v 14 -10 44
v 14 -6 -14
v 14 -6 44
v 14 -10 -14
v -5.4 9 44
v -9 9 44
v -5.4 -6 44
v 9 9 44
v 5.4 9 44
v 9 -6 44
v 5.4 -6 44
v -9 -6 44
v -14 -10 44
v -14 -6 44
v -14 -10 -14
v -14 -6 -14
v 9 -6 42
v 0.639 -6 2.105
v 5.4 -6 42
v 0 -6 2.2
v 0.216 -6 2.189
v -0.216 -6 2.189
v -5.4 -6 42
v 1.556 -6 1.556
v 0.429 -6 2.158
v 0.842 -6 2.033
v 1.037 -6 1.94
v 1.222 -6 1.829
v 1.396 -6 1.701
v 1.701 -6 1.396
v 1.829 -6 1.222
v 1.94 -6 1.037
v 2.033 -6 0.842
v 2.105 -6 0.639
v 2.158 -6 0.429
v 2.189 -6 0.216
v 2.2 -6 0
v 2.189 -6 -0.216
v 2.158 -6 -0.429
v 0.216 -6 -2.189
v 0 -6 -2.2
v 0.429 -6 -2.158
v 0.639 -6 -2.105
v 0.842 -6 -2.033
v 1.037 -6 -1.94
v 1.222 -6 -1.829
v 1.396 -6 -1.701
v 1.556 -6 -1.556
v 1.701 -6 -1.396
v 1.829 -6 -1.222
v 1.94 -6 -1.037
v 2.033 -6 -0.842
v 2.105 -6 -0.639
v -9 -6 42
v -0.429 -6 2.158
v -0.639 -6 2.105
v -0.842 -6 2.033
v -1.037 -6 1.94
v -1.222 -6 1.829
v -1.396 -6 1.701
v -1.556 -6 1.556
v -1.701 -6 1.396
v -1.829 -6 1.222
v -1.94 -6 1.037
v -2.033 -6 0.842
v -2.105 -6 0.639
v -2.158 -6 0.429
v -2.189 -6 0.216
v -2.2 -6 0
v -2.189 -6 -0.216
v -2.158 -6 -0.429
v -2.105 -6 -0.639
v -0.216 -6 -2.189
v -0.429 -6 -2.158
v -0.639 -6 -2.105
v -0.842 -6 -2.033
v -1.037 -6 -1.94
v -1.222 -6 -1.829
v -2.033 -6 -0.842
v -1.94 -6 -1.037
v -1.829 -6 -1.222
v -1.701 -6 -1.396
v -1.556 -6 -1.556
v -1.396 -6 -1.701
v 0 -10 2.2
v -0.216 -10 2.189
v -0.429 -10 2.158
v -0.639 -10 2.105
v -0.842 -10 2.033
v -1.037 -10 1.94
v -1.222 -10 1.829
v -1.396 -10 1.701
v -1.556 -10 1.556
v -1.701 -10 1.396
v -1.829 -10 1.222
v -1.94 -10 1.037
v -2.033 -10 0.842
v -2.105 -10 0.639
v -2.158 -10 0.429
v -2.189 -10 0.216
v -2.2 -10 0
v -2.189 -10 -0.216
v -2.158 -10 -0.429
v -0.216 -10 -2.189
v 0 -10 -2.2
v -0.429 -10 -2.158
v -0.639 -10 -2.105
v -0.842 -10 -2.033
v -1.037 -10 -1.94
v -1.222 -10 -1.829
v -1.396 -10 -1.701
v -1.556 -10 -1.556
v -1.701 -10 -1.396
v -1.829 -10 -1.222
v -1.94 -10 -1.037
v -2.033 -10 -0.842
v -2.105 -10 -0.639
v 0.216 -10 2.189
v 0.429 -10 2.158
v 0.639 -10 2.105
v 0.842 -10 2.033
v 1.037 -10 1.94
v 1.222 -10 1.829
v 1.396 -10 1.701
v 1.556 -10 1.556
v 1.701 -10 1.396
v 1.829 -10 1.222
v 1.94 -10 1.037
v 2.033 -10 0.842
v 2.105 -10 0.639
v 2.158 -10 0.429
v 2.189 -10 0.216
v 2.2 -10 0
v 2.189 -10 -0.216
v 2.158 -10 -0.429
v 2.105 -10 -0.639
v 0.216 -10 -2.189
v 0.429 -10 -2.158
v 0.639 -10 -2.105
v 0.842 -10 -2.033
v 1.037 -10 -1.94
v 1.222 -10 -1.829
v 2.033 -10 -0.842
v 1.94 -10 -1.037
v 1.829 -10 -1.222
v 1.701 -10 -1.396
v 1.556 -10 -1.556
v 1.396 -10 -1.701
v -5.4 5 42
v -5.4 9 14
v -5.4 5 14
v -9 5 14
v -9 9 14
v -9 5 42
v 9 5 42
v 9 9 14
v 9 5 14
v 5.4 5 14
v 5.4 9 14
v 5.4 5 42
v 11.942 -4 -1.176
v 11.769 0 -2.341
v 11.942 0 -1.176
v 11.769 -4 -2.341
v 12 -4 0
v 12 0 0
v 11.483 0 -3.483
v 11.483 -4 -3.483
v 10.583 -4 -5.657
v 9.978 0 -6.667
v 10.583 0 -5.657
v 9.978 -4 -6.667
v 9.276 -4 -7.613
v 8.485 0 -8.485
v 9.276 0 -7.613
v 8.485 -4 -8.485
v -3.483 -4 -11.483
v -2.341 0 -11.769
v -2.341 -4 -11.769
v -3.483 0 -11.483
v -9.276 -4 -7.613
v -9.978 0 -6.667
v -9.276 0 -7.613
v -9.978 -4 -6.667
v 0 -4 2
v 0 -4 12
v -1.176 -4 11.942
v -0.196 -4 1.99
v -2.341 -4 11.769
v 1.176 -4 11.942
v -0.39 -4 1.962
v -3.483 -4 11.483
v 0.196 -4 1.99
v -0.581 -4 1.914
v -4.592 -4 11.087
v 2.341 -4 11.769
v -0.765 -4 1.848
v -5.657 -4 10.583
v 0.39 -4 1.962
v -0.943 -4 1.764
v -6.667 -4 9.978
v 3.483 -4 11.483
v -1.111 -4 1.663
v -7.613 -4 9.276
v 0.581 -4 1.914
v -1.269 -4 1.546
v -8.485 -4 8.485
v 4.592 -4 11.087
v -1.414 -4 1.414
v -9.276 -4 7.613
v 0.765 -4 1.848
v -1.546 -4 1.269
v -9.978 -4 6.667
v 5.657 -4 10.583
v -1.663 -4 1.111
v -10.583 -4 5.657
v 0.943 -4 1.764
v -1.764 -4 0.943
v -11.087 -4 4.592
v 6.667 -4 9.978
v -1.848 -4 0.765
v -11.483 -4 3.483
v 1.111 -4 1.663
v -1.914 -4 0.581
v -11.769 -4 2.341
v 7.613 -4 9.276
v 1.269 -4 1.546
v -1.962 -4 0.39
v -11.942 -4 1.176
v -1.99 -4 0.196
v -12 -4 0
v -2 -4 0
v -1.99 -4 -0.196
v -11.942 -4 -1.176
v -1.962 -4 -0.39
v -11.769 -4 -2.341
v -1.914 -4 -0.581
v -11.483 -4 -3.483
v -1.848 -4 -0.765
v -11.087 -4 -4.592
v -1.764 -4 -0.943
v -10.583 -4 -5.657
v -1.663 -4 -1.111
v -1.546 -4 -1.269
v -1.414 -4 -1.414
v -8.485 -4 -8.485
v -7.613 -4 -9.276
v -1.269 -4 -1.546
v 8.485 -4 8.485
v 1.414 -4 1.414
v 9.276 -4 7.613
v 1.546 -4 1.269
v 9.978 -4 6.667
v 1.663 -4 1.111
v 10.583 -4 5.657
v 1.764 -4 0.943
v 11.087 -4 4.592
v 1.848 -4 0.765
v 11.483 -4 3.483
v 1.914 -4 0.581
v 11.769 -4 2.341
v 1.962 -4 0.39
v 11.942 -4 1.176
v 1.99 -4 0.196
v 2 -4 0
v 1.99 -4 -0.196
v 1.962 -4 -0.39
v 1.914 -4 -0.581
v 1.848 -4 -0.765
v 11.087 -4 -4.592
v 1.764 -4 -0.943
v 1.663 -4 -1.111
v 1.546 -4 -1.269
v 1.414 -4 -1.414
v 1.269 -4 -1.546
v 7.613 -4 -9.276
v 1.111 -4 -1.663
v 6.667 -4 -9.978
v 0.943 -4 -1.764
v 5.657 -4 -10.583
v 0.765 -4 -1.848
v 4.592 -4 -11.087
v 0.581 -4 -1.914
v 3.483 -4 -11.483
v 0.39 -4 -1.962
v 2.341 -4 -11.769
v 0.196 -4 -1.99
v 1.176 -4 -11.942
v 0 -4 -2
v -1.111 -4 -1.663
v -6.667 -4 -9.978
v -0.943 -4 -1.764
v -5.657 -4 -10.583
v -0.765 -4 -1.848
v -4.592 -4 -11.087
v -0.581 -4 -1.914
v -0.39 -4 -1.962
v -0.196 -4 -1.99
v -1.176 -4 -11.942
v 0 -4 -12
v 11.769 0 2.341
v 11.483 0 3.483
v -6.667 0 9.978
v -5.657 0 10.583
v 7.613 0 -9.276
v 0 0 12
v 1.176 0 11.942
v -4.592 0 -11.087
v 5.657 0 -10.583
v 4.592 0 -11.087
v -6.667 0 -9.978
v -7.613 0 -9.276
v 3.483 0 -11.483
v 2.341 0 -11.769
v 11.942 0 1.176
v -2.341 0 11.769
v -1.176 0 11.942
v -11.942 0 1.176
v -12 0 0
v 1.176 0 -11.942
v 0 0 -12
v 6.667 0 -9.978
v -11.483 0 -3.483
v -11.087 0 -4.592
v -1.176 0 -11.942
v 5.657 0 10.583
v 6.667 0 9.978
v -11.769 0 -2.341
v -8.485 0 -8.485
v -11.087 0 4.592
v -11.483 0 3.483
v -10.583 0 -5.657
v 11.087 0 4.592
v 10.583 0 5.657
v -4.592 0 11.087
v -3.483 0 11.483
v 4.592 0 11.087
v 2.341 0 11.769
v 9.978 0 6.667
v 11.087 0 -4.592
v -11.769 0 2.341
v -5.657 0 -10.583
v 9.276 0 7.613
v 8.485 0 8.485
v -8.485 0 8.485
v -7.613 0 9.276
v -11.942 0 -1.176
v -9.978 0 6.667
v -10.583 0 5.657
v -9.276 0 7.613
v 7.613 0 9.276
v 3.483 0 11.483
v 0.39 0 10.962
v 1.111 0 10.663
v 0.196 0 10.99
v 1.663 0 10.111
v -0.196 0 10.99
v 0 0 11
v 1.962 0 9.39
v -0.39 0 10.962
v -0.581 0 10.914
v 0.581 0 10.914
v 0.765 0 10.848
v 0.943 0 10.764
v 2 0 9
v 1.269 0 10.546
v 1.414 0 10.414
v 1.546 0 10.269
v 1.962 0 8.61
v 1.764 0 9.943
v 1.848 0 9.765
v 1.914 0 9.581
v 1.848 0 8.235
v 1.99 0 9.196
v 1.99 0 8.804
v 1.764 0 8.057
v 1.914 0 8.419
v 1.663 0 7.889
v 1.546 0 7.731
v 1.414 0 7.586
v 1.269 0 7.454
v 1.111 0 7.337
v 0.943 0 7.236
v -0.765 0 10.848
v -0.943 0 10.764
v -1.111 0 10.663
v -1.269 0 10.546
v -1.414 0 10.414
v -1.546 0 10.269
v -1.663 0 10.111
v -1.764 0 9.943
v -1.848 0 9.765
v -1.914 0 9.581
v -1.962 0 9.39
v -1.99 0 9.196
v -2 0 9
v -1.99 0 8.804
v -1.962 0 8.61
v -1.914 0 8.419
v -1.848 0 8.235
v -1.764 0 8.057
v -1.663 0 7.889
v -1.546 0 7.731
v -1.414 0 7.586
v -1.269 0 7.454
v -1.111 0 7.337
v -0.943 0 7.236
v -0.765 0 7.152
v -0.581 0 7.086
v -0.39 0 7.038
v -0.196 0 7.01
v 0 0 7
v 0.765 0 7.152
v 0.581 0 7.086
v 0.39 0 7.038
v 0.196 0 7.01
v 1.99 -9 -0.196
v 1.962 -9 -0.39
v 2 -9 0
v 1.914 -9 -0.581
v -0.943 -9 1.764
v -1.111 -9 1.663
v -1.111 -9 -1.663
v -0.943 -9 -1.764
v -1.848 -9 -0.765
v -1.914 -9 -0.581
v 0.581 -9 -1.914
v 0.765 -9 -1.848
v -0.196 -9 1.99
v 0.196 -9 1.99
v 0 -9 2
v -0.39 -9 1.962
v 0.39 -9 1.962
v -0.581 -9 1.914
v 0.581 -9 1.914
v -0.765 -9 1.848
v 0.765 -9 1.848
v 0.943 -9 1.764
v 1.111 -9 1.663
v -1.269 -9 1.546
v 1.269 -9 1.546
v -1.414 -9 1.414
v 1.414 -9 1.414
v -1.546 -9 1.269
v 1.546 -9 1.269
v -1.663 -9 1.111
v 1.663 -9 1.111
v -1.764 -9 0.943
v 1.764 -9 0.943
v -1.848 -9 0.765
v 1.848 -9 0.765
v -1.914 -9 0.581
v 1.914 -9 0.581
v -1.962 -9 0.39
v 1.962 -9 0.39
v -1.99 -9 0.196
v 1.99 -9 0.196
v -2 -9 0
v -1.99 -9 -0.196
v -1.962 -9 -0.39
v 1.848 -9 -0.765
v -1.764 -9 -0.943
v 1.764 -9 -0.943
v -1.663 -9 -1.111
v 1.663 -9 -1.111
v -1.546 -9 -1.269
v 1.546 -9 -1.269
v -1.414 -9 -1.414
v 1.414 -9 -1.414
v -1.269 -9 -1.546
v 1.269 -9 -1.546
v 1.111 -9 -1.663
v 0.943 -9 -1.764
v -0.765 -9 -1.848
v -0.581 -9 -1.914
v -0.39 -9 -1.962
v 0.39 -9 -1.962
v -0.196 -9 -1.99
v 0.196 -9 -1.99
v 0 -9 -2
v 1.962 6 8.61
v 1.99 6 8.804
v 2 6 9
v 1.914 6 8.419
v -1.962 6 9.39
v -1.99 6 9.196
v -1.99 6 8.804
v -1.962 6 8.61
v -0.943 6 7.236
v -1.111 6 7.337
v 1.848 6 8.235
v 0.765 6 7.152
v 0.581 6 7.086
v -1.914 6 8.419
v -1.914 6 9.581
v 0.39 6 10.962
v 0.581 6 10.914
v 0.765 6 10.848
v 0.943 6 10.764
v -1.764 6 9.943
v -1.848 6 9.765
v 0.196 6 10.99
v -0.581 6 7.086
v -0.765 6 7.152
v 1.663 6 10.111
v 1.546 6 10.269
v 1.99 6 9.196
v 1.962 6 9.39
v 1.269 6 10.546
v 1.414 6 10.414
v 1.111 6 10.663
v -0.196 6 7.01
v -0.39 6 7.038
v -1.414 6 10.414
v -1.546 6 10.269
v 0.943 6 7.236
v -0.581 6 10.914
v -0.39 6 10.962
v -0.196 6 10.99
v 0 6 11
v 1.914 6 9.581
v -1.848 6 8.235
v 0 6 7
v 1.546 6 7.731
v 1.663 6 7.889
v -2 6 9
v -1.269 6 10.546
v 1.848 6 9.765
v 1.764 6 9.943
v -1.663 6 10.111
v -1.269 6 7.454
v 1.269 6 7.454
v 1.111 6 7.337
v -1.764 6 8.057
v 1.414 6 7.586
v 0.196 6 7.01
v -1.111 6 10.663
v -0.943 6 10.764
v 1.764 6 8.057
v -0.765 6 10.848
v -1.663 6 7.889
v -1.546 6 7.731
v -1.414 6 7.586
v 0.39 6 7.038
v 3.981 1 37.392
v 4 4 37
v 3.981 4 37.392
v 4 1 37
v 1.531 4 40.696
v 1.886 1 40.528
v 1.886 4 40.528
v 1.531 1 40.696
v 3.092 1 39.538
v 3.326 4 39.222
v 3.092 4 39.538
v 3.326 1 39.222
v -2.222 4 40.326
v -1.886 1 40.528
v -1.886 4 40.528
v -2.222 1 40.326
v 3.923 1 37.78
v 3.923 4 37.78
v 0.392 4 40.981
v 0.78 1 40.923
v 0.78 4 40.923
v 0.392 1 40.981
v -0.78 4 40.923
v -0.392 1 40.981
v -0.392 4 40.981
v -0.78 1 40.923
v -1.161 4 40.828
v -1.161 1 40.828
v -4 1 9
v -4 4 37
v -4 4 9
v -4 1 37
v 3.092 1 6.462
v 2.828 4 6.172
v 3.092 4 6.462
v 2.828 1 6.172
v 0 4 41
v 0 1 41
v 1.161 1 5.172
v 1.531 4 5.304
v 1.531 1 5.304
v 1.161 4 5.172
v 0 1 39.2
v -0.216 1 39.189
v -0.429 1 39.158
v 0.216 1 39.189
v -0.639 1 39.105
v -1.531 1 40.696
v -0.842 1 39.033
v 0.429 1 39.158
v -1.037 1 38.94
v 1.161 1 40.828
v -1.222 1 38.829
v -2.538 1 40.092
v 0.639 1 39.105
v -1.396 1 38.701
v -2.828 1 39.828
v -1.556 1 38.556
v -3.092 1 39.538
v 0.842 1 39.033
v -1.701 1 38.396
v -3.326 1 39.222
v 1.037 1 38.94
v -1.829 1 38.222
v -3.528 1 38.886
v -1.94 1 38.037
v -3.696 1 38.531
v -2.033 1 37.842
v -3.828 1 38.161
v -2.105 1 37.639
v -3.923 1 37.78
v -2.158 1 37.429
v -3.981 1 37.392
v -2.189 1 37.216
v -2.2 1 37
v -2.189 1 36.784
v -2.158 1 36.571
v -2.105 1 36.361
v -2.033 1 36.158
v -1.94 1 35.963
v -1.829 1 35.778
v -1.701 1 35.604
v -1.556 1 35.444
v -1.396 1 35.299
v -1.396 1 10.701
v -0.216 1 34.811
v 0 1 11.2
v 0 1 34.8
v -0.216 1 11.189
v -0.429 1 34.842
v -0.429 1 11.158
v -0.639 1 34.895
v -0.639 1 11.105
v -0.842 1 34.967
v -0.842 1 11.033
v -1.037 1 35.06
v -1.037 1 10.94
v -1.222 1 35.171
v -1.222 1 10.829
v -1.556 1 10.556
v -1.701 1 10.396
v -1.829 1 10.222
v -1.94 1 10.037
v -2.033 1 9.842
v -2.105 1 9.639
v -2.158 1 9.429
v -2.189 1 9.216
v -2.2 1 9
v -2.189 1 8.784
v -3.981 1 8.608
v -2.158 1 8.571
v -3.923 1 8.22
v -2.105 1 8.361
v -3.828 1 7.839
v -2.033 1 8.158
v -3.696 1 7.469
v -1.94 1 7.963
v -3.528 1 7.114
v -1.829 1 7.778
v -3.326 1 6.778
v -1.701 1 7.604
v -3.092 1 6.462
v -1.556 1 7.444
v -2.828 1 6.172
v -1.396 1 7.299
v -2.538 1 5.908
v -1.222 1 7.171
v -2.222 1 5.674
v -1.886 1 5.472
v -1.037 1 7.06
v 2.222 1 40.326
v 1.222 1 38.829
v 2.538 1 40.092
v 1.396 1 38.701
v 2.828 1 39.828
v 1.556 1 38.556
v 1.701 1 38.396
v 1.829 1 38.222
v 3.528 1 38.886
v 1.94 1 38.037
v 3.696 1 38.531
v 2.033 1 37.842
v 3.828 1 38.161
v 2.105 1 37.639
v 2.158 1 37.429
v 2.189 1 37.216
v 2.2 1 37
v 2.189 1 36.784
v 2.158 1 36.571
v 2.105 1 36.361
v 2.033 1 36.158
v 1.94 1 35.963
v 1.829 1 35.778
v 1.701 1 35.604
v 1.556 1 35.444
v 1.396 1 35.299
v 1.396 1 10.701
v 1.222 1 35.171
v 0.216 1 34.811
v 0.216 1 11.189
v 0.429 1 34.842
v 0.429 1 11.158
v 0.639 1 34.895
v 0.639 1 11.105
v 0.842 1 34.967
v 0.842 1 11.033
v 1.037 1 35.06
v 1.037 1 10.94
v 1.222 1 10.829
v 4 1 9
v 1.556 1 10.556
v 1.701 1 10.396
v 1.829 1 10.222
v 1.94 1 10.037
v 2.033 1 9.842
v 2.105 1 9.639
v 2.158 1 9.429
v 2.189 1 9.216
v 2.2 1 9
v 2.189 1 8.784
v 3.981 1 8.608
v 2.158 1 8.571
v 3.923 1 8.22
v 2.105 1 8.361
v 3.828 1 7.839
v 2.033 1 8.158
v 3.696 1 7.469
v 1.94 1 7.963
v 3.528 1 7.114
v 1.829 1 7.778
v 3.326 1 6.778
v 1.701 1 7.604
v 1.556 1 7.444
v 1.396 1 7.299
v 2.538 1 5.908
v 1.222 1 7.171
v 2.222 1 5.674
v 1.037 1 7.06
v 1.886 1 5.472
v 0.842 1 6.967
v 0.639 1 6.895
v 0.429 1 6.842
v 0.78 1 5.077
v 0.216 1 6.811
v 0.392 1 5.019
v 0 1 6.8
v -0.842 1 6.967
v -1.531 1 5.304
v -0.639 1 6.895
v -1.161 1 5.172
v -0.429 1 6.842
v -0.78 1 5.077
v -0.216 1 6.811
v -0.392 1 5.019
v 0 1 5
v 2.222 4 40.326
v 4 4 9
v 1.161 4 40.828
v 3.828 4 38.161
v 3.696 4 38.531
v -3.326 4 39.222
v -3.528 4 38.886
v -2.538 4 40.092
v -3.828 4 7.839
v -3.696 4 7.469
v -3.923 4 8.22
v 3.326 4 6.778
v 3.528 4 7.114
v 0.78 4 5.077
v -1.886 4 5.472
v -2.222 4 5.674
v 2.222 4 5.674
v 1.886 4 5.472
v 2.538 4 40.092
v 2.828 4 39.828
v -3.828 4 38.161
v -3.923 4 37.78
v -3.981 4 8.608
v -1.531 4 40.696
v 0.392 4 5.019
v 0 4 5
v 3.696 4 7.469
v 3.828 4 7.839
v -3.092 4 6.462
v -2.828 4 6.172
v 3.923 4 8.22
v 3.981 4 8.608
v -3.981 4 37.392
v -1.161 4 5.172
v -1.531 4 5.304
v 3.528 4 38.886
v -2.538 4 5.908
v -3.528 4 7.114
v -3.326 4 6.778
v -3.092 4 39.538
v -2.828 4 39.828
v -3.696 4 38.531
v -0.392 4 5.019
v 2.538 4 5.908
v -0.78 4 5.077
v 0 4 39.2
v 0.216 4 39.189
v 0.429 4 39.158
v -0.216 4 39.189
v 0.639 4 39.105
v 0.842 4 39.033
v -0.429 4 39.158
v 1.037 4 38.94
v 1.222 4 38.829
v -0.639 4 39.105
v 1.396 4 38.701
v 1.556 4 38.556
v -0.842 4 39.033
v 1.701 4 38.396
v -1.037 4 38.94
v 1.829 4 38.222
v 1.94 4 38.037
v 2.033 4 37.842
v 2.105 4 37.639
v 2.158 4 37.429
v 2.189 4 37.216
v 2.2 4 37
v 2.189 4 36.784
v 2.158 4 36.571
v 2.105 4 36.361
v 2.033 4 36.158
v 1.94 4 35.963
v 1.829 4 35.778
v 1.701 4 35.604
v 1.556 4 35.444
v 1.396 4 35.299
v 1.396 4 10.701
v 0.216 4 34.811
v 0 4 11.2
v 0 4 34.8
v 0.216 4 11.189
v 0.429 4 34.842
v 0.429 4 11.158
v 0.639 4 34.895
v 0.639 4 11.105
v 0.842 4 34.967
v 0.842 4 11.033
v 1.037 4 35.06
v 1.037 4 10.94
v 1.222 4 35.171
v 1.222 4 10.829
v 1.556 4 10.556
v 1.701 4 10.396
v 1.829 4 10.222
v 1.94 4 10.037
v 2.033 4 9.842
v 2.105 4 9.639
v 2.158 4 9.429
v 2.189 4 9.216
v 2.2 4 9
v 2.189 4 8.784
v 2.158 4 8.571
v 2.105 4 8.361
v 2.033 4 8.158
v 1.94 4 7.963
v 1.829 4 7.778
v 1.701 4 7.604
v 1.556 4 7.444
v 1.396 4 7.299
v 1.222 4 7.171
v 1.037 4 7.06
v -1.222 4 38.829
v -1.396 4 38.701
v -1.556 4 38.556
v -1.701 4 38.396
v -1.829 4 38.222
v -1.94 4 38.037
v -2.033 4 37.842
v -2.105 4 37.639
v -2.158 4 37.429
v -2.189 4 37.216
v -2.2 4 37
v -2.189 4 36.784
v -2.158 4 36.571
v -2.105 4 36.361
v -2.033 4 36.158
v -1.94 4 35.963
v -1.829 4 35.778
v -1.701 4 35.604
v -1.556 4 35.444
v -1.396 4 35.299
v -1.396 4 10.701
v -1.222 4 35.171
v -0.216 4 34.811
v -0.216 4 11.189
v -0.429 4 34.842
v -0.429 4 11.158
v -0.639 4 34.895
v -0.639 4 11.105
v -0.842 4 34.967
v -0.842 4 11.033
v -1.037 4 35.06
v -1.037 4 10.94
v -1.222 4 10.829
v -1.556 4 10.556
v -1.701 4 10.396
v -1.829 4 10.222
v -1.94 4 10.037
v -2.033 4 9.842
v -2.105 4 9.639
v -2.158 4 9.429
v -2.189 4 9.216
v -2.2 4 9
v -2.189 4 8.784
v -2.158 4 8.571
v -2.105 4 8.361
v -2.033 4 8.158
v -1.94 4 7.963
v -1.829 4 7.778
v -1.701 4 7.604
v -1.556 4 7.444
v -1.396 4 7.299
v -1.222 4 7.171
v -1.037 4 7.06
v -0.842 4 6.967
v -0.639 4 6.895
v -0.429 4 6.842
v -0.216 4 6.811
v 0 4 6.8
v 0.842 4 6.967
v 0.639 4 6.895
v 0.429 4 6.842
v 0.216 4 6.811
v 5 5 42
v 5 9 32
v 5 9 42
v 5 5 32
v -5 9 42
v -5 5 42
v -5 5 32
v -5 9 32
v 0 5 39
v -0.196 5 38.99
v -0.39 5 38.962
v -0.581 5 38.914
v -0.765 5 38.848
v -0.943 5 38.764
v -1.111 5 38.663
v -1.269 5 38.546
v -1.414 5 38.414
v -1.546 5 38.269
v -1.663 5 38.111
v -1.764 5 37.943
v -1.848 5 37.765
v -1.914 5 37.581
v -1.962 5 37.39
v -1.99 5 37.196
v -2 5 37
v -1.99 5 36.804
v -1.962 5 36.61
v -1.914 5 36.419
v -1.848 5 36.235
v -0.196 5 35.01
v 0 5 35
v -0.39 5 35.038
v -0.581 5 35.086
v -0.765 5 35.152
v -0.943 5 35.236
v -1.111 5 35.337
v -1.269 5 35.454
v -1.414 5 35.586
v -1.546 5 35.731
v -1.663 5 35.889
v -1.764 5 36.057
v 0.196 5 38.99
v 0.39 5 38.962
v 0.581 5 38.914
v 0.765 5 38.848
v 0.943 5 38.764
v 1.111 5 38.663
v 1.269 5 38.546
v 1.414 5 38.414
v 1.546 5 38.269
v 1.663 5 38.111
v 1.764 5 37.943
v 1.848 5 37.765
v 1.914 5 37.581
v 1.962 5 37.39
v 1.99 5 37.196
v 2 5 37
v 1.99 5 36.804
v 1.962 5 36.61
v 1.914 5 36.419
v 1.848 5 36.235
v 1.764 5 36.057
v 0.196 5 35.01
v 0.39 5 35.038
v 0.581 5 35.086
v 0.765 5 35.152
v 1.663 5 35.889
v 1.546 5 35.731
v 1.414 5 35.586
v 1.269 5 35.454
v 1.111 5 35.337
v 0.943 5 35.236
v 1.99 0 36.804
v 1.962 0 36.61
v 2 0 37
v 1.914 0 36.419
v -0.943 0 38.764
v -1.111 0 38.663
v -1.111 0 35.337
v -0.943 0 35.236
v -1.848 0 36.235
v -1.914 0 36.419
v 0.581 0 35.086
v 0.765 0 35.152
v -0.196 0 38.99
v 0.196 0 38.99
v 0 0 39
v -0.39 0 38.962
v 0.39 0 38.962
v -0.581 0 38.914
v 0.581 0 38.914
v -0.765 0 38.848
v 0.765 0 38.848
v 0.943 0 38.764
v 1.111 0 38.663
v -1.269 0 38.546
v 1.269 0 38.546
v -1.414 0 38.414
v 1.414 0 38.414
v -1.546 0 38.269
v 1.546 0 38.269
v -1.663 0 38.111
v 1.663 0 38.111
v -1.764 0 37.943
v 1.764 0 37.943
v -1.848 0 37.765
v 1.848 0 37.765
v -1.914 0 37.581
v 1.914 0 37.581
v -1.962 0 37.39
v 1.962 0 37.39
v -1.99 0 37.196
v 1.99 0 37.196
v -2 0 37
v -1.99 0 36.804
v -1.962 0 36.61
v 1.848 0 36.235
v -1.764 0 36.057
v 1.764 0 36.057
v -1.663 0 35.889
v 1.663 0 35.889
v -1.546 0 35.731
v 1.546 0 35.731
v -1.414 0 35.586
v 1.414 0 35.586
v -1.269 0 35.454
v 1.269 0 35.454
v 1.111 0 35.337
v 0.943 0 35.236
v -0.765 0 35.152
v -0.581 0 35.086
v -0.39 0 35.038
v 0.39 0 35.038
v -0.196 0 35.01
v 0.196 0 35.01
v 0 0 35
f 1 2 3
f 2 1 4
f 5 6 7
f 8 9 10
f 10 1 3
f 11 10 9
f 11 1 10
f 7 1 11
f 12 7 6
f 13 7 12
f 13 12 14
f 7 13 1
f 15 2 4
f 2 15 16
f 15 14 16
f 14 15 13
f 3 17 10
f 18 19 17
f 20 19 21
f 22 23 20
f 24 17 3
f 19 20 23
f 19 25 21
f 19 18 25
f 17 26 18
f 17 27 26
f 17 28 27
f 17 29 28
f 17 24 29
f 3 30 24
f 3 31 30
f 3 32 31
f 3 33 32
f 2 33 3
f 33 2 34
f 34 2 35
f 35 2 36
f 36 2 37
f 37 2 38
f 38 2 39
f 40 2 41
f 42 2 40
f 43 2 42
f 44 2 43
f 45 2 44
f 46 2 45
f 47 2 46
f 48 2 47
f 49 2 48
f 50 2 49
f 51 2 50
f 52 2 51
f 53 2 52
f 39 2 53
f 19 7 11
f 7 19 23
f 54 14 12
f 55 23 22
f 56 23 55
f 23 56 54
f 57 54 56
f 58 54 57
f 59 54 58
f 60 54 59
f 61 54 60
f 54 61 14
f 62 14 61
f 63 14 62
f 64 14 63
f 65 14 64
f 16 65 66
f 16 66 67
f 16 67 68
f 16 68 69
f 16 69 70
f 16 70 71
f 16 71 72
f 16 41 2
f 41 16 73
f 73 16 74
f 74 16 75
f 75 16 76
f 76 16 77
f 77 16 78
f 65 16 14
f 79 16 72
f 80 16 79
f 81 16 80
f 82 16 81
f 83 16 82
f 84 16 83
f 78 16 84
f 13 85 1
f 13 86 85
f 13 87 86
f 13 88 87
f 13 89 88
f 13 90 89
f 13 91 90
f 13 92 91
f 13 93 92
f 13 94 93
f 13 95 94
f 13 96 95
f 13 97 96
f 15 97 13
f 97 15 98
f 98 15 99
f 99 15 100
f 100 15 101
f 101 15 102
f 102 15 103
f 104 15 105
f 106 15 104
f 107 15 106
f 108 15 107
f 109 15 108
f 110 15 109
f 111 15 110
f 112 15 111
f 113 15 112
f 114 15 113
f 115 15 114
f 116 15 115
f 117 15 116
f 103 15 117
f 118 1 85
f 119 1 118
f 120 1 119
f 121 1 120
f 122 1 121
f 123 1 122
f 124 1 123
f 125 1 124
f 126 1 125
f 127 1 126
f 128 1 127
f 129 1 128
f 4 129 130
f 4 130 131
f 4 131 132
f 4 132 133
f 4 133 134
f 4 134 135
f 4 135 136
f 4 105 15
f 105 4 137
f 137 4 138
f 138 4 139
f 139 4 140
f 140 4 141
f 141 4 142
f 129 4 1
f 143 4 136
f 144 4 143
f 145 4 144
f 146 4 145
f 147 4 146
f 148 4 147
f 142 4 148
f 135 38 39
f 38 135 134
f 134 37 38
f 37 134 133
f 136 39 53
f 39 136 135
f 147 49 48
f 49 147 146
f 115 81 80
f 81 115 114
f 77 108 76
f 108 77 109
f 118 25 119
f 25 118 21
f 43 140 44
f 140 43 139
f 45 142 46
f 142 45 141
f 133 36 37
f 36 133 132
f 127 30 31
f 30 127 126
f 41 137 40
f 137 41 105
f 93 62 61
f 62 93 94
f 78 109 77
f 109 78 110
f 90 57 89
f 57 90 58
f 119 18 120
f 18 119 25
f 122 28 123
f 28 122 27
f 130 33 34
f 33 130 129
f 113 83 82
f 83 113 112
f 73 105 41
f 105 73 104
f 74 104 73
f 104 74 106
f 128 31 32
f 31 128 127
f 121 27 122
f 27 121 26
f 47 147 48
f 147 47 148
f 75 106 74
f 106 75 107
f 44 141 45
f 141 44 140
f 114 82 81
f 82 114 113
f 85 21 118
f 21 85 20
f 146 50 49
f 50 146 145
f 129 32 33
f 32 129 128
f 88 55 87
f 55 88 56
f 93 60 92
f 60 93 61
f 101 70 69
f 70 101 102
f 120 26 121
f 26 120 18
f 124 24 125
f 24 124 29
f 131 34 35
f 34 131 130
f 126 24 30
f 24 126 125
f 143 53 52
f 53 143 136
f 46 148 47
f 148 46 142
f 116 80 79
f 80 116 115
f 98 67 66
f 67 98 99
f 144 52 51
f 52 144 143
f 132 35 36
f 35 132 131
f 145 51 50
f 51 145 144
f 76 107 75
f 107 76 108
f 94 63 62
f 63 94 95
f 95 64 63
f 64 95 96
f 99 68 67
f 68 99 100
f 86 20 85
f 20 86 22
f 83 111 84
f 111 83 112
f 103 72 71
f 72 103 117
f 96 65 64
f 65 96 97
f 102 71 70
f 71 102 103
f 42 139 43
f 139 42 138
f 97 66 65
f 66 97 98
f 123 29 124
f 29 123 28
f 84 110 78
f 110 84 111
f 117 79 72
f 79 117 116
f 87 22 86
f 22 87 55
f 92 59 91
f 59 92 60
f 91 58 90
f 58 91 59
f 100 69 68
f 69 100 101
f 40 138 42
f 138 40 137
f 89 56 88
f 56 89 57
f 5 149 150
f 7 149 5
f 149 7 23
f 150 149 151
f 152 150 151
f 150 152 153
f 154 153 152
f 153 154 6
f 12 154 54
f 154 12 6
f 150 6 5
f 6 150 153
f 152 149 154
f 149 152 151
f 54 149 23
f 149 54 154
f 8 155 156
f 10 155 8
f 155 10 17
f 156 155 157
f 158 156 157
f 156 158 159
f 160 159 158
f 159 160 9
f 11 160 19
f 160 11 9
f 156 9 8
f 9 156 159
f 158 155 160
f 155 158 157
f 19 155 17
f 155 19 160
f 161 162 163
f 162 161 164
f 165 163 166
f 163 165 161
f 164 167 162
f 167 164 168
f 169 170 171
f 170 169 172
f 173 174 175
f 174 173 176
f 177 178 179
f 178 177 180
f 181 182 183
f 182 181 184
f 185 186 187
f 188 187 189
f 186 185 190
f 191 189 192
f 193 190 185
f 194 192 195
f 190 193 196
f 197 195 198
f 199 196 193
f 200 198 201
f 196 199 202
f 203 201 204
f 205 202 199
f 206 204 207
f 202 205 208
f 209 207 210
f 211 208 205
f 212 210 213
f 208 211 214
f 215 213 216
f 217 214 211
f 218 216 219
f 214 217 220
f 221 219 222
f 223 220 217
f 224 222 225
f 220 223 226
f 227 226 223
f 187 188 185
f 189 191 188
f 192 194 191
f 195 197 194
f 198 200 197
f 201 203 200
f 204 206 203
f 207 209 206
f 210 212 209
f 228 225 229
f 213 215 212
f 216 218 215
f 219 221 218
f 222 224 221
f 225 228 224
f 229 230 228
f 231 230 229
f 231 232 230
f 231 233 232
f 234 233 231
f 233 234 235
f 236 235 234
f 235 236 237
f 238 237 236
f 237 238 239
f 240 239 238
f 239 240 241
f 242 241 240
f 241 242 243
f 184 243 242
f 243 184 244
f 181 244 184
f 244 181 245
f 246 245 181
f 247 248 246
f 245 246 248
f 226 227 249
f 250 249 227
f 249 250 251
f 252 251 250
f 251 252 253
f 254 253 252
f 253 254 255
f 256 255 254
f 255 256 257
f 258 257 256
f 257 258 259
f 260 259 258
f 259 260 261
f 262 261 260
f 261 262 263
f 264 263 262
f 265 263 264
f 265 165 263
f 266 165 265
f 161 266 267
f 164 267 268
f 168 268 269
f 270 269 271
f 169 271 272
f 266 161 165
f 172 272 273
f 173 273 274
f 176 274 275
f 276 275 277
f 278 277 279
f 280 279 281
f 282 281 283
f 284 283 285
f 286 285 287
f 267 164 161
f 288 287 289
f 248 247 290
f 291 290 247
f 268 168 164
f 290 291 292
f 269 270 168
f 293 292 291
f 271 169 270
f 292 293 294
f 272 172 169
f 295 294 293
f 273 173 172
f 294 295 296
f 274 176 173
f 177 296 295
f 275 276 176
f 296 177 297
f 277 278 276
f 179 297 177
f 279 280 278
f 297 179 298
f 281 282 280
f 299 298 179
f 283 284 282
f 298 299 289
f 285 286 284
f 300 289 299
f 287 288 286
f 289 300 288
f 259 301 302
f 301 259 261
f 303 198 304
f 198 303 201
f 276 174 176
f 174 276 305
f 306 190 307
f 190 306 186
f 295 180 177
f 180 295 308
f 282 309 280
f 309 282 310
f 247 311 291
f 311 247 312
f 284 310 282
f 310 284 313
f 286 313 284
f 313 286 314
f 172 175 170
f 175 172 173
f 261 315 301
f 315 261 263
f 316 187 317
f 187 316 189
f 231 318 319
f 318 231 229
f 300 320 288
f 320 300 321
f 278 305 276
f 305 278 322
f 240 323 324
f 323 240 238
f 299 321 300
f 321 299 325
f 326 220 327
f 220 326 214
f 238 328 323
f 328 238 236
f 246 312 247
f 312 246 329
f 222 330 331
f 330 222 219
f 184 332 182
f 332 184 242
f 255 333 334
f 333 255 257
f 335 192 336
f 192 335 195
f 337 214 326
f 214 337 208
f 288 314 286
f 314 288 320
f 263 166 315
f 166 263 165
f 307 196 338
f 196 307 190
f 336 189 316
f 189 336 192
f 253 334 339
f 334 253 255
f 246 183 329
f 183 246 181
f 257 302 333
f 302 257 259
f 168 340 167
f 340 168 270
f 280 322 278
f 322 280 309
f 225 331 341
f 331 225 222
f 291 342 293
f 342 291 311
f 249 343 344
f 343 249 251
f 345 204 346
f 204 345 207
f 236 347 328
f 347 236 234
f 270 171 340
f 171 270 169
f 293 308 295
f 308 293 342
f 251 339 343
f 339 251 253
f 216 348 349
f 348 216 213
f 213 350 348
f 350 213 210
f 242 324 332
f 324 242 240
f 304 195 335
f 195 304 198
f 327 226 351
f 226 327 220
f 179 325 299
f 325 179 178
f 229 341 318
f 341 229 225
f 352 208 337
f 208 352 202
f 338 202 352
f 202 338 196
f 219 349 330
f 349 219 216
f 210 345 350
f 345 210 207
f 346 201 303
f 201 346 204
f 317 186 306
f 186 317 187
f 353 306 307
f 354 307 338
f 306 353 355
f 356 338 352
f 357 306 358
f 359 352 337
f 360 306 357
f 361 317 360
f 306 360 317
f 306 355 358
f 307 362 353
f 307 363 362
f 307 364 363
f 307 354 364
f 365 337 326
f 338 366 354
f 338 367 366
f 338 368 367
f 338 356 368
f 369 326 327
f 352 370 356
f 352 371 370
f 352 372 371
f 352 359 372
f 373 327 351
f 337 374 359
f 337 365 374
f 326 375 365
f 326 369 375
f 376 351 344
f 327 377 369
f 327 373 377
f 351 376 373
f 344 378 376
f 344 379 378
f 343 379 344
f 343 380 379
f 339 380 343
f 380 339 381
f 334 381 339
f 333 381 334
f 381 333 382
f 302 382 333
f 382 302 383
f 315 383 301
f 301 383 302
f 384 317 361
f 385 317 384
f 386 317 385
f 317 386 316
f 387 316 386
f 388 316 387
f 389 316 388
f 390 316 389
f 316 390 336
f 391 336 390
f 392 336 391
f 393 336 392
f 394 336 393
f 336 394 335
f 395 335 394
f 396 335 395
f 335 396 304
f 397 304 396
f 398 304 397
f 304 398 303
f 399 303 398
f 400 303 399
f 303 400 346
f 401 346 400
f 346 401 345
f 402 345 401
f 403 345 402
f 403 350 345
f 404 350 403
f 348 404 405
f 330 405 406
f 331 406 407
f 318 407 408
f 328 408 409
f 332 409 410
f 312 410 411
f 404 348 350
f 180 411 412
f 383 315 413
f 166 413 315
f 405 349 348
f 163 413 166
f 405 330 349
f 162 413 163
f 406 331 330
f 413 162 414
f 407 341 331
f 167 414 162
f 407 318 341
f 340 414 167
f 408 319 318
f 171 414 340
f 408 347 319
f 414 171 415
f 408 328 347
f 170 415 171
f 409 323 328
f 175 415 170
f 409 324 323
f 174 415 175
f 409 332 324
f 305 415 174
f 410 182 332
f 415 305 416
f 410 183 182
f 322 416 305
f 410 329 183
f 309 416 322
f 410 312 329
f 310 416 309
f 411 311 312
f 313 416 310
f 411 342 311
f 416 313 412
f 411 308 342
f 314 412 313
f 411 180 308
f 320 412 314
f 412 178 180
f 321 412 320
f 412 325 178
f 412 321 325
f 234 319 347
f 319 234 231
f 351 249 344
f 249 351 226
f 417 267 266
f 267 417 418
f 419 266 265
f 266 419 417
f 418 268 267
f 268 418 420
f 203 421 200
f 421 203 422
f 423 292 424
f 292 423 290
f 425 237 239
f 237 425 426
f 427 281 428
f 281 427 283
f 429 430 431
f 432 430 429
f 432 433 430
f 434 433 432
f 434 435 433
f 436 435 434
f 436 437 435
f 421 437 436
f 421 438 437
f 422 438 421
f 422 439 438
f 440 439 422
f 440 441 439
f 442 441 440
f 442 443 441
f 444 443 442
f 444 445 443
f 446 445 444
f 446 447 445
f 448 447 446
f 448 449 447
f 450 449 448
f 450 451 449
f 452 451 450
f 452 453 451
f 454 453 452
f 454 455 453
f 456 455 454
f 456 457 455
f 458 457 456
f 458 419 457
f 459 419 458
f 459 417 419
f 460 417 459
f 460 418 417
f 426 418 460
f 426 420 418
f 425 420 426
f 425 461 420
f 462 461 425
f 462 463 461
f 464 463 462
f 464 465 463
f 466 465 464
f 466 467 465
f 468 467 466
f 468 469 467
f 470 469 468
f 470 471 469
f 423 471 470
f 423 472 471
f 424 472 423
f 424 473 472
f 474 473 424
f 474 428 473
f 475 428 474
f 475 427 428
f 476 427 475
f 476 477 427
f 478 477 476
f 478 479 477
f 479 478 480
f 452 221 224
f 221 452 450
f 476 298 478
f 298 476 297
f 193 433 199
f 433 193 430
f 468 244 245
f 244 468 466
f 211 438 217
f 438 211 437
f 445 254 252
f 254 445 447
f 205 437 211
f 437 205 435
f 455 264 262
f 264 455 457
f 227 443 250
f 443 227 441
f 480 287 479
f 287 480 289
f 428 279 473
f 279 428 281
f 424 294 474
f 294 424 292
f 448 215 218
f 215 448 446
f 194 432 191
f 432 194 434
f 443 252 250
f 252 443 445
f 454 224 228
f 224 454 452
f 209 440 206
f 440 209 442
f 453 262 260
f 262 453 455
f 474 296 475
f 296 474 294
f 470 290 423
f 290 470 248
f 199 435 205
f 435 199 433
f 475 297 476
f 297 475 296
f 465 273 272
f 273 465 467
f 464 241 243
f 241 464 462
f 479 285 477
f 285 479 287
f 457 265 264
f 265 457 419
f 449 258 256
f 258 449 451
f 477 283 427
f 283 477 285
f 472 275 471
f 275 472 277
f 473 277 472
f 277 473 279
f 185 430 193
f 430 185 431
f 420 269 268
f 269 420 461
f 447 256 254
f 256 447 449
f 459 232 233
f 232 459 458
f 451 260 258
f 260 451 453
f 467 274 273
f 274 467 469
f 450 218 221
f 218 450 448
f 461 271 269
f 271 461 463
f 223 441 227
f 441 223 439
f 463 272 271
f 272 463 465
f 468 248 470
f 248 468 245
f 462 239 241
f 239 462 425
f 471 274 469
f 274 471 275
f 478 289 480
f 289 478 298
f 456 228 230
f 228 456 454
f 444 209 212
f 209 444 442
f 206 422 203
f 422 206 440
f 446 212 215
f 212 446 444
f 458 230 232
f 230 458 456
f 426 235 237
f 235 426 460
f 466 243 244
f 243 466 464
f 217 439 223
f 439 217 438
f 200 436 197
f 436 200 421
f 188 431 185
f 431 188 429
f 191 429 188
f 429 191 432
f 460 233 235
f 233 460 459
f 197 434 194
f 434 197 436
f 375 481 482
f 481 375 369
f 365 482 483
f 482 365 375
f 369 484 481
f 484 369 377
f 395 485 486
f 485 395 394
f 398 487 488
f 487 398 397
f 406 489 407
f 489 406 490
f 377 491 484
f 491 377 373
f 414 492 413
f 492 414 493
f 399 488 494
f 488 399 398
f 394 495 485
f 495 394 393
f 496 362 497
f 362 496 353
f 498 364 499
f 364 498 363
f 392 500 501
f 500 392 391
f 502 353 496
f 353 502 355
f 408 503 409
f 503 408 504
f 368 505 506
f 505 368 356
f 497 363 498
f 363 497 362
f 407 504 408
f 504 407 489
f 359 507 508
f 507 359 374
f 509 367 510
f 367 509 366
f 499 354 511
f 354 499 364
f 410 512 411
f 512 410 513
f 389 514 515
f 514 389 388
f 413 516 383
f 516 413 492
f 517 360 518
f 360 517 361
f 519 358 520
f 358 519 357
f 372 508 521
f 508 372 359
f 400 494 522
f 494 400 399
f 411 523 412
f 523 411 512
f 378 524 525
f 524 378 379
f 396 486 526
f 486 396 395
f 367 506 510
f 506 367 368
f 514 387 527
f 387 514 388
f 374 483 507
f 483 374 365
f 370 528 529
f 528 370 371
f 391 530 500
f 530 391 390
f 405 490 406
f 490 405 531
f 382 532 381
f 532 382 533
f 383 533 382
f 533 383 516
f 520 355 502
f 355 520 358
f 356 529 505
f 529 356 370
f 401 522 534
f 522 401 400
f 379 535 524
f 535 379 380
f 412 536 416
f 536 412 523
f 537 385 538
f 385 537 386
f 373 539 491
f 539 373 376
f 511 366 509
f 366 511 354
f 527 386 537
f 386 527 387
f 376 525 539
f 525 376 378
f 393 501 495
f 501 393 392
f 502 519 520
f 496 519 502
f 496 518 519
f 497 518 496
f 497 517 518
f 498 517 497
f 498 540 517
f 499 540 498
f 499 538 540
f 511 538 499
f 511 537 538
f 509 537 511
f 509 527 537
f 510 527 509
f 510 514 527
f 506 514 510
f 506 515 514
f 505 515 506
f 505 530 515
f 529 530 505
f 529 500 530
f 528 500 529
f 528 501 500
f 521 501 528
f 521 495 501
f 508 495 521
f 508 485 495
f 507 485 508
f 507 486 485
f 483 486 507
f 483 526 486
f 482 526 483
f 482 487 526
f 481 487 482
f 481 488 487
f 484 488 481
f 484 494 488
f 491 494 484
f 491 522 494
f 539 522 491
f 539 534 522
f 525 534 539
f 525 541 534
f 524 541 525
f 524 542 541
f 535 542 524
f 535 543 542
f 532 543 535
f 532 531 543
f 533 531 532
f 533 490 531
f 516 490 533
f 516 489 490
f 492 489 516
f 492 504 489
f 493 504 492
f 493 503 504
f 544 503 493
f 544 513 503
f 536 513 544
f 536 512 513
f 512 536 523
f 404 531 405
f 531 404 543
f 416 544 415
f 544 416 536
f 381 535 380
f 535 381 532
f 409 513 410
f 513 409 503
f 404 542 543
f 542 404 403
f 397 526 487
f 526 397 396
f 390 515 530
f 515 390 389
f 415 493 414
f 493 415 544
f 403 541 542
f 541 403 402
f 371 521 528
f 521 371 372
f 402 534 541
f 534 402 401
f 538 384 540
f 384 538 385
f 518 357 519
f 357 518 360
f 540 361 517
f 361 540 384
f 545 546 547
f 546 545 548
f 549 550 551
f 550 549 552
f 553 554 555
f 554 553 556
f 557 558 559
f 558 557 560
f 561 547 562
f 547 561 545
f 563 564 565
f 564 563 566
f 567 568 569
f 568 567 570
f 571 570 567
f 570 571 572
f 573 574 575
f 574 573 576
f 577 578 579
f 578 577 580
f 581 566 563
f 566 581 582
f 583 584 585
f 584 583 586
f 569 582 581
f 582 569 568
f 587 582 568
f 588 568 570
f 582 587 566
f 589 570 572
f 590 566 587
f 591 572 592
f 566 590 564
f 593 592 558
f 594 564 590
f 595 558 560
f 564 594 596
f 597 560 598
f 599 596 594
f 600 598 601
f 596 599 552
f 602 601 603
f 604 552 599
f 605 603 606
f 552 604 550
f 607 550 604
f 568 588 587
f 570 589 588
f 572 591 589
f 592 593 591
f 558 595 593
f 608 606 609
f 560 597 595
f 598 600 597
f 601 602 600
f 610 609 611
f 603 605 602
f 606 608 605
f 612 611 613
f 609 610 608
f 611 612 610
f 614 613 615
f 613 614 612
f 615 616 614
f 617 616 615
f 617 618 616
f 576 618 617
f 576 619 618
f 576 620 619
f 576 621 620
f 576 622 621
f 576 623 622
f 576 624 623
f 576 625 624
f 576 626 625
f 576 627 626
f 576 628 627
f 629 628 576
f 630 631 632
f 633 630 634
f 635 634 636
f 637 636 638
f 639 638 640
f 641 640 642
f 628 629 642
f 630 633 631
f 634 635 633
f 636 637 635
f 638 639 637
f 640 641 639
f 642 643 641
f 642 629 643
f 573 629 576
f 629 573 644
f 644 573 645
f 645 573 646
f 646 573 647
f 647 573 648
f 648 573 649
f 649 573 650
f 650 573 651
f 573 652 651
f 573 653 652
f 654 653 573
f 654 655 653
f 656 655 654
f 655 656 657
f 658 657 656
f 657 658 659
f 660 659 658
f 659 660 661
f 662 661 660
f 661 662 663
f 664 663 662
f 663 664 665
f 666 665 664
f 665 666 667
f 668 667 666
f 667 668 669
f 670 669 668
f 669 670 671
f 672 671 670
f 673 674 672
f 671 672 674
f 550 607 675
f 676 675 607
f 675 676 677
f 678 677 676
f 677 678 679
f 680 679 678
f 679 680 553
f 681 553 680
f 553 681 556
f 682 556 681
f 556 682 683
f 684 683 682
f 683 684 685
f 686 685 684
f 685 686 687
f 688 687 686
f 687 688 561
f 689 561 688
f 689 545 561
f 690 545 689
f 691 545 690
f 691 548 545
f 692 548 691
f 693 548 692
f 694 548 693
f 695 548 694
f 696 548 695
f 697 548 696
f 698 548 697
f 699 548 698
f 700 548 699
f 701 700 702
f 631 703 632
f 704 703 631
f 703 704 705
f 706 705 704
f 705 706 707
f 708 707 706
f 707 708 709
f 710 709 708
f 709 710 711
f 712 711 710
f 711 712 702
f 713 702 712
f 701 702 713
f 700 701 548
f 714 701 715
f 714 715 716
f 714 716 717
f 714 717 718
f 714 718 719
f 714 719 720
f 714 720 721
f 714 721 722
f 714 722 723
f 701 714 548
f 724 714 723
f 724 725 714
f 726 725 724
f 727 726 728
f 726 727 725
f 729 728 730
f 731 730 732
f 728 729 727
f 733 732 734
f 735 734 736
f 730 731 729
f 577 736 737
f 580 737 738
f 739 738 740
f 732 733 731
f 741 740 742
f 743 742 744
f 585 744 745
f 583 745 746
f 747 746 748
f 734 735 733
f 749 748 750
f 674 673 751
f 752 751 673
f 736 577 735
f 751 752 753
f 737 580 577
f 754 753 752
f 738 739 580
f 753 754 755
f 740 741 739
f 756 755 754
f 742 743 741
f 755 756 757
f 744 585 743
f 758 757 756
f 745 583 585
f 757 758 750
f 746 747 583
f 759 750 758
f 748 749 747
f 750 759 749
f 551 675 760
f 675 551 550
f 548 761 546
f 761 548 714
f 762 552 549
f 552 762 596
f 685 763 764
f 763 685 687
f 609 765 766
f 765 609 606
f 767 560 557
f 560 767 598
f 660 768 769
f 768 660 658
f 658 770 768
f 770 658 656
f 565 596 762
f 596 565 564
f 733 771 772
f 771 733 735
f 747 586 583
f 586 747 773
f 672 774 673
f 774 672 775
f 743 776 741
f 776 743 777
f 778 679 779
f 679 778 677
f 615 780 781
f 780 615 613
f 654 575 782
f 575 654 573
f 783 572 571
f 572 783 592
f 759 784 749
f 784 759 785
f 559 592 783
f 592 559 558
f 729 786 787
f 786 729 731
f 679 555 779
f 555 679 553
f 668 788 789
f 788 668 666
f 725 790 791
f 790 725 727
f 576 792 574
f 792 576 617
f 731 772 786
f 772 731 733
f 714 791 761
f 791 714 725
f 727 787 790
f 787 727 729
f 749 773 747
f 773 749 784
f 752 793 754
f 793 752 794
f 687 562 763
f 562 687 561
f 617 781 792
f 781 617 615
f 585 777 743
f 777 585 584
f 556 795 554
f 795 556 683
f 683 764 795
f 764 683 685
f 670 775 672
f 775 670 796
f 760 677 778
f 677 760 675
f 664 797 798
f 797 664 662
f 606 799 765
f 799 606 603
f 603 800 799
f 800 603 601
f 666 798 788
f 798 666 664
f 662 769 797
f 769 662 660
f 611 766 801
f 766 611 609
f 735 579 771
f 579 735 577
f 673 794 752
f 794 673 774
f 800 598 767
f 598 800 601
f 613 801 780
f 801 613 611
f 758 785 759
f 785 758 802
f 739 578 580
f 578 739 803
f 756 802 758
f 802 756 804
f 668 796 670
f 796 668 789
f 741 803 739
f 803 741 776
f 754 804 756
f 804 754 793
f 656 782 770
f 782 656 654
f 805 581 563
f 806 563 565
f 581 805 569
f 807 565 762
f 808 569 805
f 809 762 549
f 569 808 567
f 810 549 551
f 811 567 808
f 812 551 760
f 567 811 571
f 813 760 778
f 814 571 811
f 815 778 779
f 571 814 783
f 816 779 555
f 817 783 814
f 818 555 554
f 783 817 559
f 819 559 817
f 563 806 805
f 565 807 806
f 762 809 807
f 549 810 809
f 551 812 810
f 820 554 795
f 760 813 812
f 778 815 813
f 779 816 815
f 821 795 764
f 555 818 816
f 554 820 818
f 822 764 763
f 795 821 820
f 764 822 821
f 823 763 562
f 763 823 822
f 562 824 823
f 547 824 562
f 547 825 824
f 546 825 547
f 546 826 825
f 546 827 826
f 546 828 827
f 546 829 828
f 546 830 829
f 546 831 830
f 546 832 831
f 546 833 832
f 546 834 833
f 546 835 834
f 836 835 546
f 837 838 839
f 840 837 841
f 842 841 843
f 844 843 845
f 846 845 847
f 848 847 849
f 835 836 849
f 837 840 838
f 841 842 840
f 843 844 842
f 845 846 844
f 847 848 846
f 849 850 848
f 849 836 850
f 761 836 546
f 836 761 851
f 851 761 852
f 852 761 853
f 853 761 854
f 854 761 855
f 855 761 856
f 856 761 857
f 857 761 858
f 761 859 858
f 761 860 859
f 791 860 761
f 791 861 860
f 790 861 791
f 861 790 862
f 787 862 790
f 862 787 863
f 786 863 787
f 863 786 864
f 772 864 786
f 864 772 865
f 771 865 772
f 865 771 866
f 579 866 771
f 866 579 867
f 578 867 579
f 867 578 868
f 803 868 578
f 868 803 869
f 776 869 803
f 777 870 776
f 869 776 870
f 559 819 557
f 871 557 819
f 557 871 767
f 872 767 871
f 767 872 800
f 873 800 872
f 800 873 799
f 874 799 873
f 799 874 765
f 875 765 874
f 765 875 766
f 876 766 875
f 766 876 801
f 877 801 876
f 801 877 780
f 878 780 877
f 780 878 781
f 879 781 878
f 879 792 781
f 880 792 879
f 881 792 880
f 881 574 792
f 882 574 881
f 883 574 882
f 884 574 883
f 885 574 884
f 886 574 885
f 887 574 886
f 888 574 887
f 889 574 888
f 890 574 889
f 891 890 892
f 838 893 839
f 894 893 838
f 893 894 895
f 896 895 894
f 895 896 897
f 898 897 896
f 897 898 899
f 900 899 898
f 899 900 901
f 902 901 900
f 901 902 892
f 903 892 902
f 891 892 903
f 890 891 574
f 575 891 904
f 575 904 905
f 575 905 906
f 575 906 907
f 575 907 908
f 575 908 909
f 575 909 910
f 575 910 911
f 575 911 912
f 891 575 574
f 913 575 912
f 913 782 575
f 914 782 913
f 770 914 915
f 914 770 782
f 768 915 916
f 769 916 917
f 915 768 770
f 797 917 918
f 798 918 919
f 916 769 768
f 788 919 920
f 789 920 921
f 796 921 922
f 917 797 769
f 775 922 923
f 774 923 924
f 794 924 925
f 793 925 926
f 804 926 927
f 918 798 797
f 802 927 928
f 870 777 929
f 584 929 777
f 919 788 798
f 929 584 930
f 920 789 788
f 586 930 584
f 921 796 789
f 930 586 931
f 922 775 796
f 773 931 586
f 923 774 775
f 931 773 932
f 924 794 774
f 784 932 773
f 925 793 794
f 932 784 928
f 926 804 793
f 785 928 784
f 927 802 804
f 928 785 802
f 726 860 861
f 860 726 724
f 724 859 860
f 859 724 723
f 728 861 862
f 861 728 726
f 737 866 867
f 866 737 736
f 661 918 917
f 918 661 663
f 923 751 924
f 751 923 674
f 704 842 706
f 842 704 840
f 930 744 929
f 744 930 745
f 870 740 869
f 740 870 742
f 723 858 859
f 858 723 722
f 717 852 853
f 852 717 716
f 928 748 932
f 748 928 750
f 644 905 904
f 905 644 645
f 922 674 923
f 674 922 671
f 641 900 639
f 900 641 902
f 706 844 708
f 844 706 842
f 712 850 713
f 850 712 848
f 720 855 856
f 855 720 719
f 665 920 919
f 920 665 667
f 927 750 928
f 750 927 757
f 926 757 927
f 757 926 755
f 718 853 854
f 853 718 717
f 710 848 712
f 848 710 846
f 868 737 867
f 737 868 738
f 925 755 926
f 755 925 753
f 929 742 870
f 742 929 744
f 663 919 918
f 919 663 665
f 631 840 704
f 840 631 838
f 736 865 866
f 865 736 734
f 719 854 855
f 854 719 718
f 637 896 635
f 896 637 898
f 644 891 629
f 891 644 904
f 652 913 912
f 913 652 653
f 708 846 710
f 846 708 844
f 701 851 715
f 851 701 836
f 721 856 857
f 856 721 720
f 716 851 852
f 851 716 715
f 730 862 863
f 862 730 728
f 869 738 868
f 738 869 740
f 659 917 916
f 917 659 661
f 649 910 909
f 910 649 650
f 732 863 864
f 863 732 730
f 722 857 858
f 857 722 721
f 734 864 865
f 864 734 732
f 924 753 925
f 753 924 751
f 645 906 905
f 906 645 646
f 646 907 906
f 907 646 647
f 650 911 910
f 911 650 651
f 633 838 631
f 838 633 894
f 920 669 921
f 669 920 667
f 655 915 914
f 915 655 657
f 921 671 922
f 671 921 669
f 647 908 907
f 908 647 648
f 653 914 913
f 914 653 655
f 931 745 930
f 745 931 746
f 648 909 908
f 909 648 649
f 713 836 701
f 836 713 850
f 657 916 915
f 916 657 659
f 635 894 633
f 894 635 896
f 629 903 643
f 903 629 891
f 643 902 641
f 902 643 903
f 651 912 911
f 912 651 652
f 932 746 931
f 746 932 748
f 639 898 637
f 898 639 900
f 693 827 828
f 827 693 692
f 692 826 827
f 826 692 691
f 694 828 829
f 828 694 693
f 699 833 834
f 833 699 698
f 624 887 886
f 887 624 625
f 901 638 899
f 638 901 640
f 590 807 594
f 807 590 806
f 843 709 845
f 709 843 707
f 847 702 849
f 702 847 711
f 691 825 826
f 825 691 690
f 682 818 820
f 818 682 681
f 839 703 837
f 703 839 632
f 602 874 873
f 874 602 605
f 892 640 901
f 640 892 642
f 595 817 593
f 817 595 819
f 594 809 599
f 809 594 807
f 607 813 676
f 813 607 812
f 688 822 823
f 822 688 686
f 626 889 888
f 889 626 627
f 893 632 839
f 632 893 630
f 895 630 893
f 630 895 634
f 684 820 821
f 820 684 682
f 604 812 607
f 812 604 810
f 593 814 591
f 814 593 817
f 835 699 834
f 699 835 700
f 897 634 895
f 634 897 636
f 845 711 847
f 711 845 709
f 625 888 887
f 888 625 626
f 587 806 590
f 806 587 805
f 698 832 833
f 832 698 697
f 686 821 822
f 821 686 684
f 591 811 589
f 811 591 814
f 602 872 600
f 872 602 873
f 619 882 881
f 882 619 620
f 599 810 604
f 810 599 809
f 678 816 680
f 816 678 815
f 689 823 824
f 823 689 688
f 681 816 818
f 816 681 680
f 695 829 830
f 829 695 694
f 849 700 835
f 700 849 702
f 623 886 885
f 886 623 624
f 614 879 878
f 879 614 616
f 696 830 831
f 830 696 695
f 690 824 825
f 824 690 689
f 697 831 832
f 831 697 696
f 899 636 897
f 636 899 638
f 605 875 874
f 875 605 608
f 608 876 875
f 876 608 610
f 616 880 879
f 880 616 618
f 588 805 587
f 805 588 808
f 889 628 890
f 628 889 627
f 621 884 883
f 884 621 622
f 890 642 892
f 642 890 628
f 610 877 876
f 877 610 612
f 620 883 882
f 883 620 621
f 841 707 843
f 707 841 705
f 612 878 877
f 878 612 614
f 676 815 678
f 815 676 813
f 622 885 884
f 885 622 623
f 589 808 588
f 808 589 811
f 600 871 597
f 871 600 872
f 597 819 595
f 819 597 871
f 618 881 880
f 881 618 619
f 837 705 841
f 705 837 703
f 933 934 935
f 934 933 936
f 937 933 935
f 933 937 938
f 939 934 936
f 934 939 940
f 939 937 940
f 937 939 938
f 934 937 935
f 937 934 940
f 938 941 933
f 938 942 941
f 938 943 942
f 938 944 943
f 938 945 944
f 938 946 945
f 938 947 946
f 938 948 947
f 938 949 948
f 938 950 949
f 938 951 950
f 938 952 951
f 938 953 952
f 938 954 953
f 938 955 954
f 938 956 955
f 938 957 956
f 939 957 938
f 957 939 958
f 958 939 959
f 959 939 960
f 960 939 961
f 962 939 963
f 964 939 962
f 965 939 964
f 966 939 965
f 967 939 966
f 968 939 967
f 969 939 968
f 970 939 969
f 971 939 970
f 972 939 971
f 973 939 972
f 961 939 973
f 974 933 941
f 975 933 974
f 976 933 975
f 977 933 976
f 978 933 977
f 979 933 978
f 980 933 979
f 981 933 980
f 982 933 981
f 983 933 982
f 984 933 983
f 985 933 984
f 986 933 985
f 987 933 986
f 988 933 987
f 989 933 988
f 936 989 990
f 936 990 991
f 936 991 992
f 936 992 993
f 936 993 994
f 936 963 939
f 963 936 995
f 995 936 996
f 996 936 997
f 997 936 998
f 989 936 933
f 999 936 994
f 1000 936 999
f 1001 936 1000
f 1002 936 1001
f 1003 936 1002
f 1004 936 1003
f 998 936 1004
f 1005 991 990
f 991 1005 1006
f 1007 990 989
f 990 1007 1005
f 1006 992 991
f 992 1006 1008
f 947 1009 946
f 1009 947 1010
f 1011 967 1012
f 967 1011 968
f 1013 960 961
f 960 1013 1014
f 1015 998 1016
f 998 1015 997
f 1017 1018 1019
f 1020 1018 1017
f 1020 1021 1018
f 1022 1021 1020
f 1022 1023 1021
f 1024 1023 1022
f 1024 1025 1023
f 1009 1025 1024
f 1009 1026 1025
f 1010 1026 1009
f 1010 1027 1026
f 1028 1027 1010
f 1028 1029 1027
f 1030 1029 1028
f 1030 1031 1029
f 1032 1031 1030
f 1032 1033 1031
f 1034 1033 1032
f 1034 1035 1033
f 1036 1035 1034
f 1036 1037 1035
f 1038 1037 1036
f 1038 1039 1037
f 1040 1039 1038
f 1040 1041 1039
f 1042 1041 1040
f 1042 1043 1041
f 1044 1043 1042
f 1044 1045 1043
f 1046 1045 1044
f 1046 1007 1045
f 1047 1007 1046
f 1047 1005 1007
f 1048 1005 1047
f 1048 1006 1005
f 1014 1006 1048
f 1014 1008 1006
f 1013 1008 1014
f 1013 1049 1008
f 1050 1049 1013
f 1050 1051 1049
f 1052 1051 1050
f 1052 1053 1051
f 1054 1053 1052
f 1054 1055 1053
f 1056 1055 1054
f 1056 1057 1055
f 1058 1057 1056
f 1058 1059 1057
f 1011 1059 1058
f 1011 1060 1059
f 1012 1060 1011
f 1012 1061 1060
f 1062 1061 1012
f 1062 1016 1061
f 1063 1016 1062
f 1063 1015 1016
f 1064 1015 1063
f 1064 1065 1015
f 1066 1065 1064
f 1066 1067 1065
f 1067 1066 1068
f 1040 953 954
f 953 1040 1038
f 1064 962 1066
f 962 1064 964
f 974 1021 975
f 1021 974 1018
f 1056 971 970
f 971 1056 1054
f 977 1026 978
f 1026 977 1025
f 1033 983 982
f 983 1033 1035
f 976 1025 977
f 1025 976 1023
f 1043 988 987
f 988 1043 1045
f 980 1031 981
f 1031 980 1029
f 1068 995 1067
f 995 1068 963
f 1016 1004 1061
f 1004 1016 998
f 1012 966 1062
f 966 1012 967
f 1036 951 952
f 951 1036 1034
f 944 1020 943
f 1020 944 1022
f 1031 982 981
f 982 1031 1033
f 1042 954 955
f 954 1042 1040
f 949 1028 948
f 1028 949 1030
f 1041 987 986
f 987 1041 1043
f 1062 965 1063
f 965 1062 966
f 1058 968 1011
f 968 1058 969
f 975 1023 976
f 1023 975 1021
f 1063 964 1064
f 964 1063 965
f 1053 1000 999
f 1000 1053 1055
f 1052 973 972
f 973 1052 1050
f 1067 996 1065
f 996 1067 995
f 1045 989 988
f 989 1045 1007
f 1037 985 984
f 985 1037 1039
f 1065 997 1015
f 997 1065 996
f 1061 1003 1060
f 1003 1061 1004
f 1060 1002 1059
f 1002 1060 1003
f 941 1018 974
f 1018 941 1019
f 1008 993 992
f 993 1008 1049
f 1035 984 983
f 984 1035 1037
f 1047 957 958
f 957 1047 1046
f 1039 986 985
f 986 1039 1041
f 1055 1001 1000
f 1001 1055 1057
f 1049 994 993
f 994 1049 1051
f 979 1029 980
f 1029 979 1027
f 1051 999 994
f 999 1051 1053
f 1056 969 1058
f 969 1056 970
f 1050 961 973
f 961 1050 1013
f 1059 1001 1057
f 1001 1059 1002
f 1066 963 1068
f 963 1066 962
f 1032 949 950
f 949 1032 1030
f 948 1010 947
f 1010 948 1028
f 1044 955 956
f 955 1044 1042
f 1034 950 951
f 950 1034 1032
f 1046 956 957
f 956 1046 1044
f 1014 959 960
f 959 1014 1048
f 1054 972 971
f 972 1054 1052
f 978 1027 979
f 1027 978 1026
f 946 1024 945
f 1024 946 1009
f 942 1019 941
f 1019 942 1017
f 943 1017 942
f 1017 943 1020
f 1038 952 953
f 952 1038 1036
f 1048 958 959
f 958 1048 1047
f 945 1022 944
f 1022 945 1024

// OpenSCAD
// Original low-speed slider-crank verification fixture, millimetres.
// Four manufacturing parts. Pins are integral; external axial retention is
// required. No load capacity, print tolerance or physical function is claimed.
agentscad_part = "all";
agentscad_pose = false;
motion_angle = 0;
crank_radius = 9;
rod_length = 28;
$fn = 64;

// All pin axes are parallel to +Y; the mechanism moves in the XZ plane.
module y_cylinder(radius, height) { rotate([-90, 0, 0]) cylinder(r=radius, h=height); }
module crank_local() {
  union() {
    translate([0, -4, 0]) y_cylinder(crank_radius + 3, 4);
    translate([0, -9, 0]) y_cylinder(2, 5.1);
    translate([0, -0.1, crank_radius]) y_cylinder(2, 6.1);
  }
}
module rod_local() {
  difference() {
    hull() {
      translate([0, 1, 0]) y_cylinder(4, 3);
      translate([0, 1, rod_length]) y_cylinder(4, 3);
    }
    translate([0, 0.9, 0]) y_cylinder(2.2, 3.2);
    translate([0, 0.9, rod_length]) y_cylinder(2.2, 3.2);
  }
}
module slider_local() {
  union() {
    translate([-5, 5, -5]) cube([10, 4, 10]);
    y_cylinder(2, 5.1);
  }
}
module frame_local() {
  union() {
    difference() {
      translate([-14, -10, -14]) cube([28, 4, 58]);
      translate([0, -10.1, 0]) y_cylinder(2.2, 4.2);
    }
    for (x = [-9, 5.4]) {
      translate([x, 5, 14]) cube([3.6, 4, 30]);
      translate([x, -6.1, 42]) cube([3.6, 11.2, 2]);
    }
  }
}

// Source-side construction. The checker measures the resulting mesh contours;
// it never consumes these functions or their computed coordinates as evidence.
cx = crank_radius * sin(motion_angle);
cz = crank_radius * cos(motion_angle);
travel = sqrt(rod_length * rod_length - cx * cx);
pz = cz + travel;
rod_angle = atan2(-cx, travel);
module selected_part(id, placed) {
  if (id == "frame") frame_local();
  if (id == "crank") rotate([0, placed ? motion_angle : 0, 0]) crank_local();
  if (id == "rod") translate(placed ? [cx, 0, cz] : [0, 0, 0])
    rotate([0, placed ? rod_angle : 0, 0]) rod_local();
  if (id == "slider") translate([0, 0, placed ? pz : 0]) slider_local();
}
module generated_part() {
  if (agentscad_part == "all") {
    for (id = ["frame", "crank", "rod", "slider"]) selected_part(id, true);
  } else selected_part(agentscad_part, agentscad_pose);
}
generated_part();
